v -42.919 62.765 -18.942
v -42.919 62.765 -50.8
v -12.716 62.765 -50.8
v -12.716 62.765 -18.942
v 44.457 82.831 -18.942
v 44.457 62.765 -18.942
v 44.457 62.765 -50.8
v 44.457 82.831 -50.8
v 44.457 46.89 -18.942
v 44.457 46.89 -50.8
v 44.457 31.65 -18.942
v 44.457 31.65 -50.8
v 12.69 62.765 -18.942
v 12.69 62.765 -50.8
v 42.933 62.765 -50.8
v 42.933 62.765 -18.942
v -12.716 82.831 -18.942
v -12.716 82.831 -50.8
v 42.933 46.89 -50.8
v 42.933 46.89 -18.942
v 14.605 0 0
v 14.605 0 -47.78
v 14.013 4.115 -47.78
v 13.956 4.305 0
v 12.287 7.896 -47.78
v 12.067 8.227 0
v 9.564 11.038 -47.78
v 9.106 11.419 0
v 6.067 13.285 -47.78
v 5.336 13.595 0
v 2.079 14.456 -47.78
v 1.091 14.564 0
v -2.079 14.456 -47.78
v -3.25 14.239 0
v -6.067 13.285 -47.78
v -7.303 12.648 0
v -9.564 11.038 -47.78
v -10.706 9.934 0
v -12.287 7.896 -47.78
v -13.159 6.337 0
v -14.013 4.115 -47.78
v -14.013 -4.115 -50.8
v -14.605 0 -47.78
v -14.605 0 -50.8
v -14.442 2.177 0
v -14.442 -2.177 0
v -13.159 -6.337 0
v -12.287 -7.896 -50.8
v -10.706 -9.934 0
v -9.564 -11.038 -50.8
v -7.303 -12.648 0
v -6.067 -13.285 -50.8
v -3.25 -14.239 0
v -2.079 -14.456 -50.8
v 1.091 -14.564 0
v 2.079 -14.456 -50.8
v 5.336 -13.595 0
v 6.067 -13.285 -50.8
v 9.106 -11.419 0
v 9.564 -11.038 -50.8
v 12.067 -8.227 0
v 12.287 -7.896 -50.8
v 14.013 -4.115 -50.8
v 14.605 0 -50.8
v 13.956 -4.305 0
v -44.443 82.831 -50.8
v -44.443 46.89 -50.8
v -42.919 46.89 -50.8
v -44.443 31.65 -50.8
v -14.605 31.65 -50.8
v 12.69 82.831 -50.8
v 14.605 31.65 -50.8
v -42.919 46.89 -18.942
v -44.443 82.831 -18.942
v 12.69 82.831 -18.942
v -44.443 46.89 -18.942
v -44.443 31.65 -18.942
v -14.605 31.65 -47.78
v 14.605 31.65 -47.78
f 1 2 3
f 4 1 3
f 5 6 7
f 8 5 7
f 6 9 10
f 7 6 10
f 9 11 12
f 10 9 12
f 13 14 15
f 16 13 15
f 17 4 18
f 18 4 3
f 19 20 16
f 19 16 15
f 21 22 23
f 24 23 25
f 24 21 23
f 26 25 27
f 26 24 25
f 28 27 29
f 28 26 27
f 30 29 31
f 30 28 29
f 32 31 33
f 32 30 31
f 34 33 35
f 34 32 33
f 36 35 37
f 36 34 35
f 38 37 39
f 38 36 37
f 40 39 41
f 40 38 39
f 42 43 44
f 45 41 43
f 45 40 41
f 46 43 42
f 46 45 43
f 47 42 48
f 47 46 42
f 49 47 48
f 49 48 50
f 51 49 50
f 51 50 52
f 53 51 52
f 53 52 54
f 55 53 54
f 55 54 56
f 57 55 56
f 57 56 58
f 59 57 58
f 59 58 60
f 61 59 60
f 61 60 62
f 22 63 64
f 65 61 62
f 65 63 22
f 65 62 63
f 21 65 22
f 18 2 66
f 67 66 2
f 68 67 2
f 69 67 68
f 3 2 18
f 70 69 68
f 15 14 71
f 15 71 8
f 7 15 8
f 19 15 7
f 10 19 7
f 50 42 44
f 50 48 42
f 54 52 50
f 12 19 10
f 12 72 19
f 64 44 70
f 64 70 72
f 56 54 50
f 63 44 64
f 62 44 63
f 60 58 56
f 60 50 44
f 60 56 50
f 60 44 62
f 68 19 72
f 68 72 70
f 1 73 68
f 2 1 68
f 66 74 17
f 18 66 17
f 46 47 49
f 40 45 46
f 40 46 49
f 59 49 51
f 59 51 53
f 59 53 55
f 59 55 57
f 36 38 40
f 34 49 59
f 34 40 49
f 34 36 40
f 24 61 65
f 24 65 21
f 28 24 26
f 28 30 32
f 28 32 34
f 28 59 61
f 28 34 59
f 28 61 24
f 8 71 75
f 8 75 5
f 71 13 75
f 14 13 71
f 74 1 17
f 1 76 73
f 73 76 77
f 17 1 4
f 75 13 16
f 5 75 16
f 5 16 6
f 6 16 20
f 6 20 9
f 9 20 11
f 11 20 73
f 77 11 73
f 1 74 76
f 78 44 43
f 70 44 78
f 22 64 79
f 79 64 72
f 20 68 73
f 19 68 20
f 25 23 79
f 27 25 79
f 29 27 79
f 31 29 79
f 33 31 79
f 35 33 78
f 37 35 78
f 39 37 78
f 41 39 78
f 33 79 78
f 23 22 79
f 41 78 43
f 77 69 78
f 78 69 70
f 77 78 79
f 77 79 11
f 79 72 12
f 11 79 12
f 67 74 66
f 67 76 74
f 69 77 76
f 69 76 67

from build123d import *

# Parameters (mm, degrees)
SKETCH1_R           = 14.605
BOSS_EXTRUDE1_DEPTH = 50.8
SKETCH2_W           = 29.21
SKETCH2_H           = 31.649894197
BOSS_EXTRUDE3_DEPTH = 3.02006
BOSS_EXTRUDE4_DEPTH = 15.24
SKETCH4_W           = 1.524
SKETCH4_H           = 31.858022221
BOSS_EXTRUDE6_DEPTH = 15.875
SKETCH5_W           = 31.726657408
SKETCH5_H           = 31.858022221
SKETCH5_W_2         = 31.767634357
BOSS_EXTRUDE7_DEPTH = 20.066


with BuildPart() as part:
    # Sketch1 → Boss-Extrude1 (new body)
    with BuildSketch(Plane.XY):
        Circle(SKETCH1_R)
    extrude(amount=-BOSS_EXTRUDE1_DEPTH)

    # Sketch2 → Boss-Extrude3 (add)
    with BuildSketch(Plane(origin=(0, 0, -50.8), x_dir=(-1, 0, 0), z_dir=(0, 0, -1))):
        with Locations((0, 15.824947099)):
            Rectangle(SKETCH2_W, SKETCH2_H)
    extrude(amount=-BOSS_EXTRUDE3_DEPTH)

    # Sketch3 → Boss-Extrude4 (add)
    with BuildSketch(Plane(origin=(0, 31.649894197, 0), x_dir=(1, 0, 0), z_dir=(0, 1, 0))):
        Polygon((-14.605, 50.8), (-44.442538052, 50.8), (-44.442538052, 18.941977779), (44.457461948, 18.941977779), (44.457461948, 50.8), align=None)
    extrude(amount=BOSS_EXTRUDE4_DEPTH)

    # Sketch4 → Boss-Extrude6 (add)
    with BuildSketch(Plane(origin=(0, 46.889894197, 0), x_dir=(1, 0, 0), z_dir=(0, 1, 0))):
        with Locations((43.695461948, 34.87098889)):
            Rectangle(SKETCH4_W, SKETCH4_H)
        with Locations((-43.680538052, 34.87098889)):
            Rectangle(SKETCH4_W, SKETCH4_H)
    extrude(amount=BOSS_EXTRUDE6_DEPTH)

    # Sketch5 → Boss-Extrude7 (add)
    with BuildSketch(Plane(origin=(0, 62.764894197, 0), x_dir=(1, 0, 0), z_dir=(0, 1, 0))):
        with Locations((-28.579209348, 34.87098889)):
            Rectangle(SKETCH5_W, SKETCH5_H)
        with Locations((28.573644769, 34.87098889)):
            Rectangle(SKETCH5_W_2, SKETCH5_H)
    extrude(amount=BOSS_EXTRUDE7_DEPTH)


solid = part.part
